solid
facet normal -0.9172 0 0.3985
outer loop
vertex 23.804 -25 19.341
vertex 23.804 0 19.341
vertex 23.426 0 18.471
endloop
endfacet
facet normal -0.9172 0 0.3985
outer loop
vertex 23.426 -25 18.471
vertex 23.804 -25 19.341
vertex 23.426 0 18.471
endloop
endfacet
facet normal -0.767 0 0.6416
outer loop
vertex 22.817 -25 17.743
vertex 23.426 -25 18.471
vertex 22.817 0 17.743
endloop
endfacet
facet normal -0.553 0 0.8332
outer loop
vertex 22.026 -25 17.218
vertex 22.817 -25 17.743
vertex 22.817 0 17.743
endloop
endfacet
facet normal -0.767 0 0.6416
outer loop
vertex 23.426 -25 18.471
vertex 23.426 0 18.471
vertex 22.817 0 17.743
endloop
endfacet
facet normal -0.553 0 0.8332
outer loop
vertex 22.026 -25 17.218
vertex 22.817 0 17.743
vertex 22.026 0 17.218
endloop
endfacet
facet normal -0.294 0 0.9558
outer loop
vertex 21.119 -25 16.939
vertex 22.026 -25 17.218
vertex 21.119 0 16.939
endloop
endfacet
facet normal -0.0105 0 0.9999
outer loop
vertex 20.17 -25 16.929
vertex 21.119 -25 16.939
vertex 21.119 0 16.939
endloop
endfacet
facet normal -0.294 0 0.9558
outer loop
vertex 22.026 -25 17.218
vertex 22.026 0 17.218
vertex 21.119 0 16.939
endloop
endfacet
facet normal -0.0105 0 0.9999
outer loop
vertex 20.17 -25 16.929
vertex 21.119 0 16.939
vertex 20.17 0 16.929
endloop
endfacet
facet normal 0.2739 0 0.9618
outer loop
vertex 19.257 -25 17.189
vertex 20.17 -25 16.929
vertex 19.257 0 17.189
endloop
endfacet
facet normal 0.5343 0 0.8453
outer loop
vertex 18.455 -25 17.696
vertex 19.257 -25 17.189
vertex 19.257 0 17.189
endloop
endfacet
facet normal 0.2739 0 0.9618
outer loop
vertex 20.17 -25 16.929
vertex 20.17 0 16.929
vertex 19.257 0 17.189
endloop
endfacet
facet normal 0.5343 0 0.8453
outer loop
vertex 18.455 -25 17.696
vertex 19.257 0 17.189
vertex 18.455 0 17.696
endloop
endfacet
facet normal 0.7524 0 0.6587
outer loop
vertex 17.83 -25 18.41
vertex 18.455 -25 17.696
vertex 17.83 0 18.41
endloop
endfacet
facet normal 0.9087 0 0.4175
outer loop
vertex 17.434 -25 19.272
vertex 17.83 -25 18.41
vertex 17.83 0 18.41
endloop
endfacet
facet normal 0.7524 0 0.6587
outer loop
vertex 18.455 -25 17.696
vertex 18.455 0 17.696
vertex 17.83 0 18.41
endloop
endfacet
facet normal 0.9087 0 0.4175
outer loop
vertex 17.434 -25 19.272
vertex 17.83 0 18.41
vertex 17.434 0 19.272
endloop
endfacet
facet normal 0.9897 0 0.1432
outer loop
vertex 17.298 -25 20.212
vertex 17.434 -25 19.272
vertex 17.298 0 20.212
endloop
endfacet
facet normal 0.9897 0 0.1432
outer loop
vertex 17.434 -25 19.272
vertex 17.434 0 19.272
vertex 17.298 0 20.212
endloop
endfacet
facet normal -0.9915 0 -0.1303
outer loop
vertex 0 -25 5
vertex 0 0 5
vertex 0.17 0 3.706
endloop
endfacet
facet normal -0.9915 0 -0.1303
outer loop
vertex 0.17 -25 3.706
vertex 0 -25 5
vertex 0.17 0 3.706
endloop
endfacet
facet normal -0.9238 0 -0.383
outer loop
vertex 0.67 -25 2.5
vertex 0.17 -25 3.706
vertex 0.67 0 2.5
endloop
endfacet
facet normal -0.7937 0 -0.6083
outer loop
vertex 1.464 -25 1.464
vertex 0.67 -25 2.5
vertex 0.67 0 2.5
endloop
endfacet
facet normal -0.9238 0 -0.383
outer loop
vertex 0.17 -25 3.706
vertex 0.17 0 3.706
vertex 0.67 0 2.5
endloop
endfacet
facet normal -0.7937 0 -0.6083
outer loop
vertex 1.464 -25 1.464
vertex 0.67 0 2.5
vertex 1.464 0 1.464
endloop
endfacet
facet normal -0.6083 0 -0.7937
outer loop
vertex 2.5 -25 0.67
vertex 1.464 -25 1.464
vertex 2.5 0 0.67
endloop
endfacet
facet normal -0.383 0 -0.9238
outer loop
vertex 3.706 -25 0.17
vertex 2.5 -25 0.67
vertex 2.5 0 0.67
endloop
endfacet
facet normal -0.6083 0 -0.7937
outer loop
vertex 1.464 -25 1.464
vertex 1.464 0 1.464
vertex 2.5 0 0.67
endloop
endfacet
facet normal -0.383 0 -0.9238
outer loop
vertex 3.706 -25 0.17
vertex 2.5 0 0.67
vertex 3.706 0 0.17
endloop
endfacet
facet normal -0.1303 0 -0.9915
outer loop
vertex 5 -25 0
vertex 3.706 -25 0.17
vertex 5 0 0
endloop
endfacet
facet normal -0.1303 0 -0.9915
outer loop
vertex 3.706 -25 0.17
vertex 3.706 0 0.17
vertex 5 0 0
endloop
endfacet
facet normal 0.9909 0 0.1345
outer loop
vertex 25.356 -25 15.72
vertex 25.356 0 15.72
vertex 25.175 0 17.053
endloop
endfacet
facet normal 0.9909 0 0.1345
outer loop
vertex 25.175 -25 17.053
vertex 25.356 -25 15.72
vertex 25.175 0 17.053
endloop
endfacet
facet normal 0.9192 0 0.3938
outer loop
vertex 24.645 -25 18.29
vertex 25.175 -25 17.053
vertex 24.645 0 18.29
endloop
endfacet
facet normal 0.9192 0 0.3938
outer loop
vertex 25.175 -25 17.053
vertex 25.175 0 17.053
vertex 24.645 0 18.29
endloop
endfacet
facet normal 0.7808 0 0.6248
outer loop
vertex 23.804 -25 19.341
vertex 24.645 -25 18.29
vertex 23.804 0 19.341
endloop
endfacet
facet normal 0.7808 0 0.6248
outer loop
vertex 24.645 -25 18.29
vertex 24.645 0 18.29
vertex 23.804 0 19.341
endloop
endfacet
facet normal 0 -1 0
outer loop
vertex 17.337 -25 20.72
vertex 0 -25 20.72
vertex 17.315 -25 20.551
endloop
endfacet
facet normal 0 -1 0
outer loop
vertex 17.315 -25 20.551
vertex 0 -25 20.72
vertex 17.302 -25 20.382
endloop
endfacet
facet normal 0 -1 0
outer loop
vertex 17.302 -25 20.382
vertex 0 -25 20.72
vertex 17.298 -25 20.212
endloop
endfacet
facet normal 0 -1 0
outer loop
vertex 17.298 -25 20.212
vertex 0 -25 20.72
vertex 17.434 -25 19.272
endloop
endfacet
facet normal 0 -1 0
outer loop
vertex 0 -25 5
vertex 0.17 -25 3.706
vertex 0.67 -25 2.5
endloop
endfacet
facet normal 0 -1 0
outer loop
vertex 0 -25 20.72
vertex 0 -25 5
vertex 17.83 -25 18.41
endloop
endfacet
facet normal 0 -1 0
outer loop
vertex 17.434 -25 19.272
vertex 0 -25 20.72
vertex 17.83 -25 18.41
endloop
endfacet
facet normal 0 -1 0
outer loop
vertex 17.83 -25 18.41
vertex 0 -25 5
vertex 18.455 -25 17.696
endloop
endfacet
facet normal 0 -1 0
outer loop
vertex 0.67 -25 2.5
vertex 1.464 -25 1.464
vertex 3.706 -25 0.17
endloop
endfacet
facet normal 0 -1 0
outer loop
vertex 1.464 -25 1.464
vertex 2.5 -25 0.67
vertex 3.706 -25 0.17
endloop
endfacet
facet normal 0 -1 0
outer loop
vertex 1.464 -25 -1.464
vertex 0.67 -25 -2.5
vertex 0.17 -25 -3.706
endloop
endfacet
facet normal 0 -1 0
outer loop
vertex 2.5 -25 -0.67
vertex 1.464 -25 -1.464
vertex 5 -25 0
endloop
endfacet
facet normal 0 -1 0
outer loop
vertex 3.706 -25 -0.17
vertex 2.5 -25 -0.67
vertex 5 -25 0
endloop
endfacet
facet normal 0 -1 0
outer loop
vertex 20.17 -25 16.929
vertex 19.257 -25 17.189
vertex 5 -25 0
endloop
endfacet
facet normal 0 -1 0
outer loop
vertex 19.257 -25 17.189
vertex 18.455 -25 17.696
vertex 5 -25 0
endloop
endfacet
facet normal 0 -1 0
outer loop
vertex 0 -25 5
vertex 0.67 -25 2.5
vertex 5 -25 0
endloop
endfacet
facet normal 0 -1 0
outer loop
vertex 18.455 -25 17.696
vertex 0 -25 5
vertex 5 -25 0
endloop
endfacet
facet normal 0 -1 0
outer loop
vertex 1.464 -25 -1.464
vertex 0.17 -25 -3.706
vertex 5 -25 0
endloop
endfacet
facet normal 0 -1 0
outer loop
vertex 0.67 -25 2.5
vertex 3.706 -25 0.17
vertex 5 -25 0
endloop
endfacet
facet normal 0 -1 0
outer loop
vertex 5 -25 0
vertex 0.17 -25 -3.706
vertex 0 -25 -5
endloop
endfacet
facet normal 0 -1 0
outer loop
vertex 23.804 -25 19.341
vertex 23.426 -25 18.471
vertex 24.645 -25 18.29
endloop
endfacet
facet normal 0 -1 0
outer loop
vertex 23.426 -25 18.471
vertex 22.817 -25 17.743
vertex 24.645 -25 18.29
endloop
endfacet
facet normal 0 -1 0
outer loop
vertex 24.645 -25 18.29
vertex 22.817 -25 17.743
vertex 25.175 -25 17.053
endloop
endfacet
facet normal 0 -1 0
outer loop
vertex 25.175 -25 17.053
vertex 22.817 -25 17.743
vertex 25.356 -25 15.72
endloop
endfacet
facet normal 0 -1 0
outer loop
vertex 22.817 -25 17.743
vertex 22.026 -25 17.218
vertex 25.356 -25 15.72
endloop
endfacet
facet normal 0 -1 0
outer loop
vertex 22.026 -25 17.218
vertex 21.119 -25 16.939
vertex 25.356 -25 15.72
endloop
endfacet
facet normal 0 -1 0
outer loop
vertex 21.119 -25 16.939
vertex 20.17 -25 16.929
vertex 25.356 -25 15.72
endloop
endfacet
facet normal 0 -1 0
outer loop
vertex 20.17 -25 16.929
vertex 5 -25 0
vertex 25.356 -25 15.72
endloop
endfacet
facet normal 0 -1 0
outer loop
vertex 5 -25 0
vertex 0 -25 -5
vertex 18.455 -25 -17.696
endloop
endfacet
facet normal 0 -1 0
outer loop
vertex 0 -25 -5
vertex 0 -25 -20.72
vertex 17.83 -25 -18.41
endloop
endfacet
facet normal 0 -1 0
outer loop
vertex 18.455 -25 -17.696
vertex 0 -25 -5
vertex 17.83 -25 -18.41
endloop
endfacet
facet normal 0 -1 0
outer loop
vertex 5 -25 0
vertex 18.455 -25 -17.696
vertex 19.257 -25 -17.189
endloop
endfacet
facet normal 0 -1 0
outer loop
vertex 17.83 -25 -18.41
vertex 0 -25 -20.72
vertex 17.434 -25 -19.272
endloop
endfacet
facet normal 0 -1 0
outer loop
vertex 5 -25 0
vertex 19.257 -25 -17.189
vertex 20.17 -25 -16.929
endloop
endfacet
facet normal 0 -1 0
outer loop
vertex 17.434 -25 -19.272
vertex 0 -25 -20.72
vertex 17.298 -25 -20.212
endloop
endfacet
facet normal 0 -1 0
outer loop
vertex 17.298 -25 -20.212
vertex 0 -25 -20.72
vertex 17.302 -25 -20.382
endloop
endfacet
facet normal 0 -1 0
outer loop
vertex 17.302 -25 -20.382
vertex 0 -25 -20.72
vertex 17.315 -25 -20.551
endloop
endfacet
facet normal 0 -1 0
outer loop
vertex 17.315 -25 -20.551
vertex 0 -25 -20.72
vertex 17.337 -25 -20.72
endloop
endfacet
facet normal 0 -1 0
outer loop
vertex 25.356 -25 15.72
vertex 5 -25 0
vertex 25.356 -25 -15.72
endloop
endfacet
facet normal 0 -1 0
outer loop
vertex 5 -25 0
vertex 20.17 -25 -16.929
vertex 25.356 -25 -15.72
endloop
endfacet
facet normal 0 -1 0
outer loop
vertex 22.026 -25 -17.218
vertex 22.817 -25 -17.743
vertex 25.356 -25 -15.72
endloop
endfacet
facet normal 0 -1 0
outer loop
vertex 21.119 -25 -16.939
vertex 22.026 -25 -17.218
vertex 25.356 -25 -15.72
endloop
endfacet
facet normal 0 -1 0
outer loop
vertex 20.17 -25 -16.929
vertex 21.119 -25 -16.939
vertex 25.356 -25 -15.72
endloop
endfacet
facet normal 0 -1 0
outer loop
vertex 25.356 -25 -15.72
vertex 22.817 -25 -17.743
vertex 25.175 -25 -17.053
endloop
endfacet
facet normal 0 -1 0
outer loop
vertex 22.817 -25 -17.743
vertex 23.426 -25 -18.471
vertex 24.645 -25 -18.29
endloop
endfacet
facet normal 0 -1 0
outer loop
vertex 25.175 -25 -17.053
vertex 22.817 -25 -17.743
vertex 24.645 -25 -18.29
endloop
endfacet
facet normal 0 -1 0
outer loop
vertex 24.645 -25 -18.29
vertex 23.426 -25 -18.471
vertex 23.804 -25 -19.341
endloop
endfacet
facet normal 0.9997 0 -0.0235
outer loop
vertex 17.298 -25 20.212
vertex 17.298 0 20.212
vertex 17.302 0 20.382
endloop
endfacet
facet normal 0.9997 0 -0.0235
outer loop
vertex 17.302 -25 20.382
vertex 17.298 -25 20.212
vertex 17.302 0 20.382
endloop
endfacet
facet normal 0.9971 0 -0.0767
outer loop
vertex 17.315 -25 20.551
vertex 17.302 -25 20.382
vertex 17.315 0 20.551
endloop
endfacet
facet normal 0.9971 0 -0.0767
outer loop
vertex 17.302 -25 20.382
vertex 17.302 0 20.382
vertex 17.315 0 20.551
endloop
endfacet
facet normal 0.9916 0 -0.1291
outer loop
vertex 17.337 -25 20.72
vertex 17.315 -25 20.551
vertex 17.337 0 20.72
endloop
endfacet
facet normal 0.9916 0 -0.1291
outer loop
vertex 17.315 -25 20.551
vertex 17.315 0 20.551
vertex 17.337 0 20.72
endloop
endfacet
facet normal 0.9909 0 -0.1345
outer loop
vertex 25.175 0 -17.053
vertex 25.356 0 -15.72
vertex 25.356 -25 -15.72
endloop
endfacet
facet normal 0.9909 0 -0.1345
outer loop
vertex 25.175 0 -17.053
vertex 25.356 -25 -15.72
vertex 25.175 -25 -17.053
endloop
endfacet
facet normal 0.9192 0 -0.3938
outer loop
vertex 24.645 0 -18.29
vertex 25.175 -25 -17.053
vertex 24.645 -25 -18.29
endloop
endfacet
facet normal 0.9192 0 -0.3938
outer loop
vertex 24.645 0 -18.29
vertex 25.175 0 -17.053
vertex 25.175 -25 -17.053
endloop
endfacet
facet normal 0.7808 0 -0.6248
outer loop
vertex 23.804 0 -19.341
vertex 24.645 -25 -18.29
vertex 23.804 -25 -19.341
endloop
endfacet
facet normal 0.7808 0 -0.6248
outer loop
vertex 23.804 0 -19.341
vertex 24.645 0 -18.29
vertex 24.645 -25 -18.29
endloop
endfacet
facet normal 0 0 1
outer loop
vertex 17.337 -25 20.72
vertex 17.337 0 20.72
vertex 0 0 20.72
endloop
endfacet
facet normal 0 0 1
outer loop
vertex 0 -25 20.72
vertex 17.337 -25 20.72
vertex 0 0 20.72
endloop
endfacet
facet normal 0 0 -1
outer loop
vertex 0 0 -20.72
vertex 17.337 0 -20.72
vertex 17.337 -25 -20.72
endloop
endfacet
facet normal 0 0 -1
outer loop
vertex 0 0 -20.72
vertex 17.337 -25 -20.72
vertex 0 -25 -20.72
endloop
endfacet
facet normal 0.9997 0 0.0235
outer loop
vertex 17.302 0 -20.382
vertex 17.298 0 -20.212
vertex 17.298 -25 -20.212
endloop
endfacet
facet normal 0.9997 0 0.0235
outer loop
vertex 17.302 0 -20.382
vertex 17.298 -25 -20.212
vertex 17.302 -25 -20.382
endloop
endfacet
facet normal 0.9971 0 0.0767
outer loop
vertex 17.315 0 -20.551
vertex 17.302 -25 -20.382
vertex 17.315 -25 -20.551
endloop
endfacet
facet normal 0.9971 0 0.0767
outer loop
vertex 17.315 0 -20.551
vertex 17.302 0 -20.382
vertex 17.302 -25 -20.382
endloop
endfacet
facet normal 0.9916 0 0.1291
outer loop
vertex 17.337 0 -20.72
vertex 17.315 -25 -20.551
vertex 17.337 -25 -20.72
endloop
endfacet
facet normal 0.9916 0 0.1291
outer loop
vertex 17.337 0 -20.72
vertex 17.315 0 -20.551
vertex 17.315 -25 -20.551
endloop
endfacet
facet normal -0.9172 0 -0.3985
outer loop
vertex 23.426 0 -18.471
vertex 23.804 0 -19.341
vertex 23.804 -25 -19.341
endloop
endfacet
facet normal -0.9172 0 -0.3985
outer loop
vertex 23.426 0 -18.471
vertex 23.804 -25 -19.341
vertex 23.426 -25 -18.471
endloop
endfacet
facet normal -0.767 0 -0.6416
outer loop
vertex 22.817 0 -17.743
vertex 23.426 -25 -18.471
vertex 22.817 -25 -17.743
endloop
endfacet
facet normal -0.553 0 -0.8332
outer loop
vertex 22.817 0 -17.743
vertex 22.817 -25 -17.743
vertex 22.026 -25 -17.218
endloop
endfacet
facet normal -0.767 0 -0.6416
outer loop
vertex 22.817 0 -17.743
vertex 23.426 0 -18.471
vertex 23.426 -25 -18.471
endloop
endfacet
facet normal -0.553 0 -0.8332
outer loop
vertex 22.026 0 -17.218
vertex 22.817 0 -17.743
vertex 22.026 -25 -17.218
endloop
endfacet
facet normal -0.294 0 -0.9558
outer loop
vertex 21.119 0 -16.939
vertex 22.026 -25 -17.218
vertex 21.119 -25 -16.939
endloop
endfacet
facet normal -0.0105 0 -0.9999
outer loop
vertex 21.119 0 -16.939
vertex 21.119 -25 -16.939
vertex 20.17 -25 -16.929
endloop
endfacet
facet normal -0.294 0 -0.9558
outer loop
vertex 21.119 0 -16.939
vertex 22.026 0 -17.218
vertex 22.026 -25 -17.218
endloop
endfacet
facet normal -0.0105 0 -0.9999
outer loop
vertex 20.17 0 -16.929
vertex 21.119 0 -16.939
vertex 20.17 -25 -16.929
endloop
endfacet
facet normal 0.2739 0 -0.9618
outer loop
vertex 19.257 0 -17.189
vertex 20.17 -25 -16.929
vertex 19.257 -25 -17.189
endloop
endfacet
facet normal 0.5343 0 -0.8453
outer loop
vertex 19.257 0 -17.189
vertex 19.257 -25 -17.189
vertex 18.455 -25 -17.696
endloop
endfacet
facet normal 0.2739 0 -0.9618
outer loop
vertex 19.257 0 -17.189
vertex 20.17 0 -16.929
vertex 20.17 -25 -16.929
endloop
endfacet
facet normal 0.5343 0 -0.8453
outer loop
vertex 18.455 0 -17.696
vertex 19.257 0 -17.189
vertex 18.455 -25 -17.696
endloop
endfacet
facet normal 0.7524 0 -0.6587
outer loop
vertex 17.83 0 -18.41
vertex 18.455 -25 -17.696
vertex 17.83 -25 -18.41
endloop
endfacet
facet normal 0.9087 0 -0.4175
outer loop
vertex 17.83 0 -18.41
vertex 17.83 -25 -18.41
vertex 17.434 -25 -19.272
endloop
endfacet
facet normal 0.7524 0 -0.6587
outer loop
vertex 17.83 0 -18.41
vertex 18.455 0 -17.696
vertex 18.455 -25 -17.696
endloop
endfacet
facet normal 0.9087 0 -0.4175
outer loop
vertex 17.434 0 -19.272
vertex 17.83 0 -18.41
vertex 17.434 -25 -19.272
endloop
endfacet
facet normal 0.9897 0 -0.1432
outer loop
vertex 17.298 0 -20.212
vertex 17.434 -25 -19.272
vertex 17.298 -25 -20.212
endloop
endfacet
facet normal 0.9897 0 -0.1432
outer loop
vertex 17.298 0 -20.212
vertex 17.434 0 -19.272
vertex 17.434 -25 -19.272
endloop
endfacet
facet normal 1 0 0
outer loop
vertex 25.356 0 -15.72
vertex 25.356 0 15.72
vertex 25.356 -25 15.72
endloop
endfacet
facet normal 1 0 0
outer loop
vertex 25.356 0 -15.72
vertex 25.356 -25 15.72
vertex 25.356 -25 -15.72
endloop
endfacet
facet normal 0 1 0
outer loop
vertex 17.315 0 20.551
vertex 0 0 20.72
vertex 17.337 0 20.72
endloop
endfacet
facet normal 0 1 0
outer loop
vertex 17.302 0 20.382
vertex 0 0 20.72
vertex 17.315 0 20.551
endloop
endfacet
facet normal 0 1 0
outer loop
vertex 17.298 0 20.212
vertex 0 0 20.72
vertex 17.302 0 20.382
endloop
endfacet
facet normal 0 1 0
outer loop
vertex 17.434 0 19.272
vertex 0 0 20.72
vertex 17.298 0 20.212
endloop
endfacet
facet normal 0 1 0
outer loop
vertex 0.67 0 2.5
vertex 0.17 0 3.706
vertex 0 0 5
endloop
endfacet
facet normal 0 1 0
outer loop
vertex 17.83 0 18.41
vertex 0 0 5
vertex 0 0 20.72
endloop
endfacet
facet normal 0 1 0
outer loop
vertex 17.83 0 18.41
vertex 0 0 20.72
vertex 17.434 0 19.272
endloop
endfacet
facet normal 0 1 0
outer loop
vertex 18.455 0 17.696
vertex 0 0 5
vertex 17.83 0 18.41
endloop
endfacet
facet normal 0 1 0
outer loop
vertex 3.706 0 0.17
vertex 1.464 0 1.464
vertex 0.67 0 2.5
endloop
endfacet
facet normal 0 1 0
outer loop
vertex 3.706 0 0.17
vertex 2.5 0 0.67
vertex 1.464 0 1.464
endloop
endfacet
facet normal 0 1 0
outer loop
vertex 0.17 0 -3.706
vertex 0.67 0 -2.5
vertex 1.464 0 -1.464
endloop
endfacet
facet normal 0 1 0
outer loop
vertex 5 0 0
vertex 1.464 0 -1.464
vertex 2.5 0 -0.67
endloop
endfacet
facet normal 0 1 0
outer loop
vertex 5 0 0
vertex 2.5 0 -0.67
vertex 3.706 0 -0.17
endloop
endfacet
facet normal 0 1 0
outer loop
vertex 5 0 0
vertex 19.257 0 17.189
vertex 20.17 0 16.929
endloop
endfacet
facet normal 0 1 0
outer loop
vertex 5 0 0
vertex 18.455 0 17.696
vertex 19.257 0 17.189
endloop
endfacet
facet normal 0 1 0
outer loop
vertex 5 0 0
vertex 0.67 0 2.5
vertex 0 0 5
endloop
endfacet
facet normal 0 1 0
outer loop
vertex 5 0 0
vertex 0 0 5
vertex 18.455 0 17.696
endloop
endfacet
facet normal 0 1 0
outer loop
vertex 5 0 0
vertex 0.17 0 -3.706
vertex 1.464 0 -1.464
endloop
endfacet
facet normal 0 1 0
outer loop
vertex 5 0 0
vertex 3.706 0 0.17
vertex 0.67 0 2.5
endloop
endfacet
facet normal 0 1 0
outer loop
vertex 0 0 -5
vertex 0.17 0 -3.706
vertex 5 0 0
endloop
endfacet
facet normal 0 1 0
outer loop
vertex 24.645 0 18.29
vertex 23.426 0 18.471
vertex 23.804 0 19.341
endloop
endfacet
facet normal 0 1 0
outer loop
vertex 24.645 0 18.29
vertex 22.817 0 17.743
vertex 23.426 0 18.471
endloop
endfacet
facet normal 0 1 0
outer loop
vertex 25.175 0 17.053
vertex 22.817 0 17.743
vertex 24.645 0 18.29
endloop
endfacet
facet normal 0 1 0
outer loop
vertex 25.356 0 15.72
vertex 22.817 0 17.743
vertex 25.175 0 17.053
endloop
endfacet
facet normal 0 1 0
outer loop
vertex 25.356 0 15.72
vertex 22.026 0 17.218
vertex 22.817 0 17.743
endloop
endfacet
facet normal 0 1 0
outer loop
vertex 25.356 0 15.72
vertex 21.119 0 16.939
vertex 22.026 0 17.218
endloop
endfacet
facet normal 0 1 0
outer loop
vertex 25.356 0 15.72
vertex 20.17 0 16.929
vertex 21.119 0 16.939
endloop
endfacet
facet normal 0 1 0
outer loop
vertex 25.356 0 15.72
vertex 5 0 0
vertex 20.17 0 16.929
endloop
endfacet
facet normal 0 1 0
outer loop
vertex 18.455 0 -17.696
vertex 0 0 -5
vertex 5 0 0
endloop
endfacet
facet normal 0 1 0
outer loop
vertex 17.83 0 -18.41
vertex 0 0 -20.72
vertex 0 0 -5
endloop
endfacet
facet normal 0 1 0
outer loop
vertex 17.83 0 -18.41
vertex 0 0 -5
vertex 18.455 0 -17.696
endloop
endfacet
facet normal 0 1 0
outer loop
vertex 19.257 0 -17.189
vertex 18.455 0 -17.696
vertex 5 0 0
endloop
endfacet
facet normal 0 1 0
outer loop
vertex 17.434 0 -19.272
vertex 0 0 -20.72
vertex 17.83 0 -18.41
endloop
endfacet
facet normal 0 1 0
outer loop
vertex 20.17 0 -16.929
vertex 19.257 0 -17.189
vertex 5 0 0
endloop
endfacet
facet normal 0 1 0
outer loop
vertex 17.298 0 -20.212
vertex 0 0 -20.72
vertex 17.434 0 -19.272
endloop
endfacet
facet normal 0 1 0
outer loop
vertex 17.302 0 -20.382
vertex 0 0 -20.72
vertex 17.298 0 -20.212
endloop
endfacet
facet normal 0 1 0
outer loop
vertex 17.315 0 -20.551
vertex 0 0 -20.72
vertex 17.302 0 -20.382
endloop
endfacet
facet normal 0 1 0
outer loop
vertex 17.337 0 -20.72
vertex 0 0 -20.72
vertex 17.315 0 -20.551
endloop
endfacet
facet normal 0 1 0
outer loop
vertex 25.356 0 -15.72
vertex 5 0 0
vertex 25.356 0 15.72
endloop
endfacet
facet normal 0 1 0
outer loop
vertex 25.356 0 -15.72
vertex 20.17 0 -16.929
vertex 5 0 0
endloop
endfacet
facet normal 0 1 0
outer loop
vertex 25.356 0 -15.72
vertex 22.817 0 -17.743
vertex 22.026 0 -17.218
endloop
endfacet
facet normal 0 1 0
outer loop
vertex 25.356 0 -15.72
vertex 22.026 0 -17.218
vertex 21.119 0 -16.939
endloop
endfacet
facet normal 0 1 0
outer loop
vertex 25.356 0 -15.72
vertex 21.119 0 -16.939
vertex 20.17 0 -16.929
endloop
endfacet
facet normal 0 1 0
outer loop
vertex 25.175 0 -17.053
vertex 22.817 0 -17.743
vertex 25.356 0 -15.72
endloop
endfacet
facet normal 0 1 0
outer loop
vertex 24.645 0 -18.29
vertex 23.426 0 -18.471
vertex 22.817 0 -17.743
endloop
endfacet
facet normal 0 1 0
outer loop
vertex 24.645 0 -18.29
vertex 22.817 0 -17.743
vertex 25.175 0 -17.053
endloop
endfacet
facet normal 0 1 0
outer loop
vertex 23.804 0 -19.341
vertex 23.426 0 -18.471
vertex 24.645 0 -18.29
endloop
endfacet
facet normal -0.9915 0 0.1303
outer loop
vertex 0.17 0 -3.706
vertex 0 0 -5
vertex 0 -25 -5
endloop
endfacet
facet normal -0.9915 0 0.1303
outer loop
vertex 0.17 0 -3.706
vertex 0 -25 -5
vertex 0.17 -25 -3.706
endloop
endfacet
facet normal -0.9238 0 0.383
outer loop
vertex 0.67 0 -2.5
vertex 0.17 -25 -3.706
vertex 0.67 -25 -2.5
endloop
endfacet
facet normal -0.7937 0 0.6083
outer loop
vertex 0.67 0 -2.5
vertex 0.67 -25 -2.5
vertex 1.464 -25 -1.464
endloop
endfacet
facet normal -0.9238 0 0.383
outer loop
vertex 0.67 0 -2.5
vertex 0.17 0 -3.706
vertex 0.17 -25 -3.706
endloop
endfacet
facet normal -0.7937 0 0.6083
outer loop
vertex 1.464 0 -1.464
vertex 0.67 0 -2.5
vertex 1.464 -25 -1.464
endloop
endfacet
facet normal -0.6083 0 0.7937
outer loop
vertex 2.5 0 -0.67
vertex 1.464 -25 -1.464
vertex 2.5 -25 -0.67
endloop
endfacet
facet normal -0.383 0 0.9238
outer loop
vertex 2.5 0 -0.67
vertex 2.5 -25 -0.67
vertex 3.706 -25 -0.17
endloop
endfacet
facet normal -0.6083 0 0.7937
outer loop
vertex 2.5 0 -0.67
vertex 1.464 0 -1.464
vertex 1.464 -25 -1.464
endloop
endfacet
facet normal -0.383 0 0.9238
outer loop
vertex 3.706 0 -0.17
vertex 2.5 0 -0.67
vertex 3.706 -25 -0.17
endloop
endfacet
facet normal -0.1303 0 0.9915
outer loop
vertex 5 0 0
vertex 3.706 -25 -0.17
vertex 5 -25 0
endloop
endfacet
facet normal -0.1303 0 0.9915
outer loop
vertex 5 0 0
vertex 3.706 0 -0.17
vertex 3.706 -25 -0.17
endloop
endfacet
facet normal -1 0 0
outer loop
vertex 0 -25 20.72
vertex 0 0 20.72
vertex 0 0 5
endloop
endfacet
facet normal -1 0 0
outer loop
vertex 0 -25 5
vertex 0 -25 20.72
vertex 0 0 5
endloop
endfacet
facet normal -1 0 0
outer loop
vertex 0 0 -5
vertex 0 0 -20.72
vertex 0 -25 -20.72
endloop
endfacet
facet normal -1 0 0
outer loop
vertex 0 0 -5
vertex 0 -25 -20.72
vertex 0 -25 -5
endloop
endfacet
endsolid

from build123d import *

# Parameters (mm, degrees)
F1_DEPTH = 25
F4_DEPTH = 25


# Not quite as in the source:
# - a pattern or mirror of a feature is missing from the dataset's text; its kind, count and spacing are read off the source's solid


with BuildPart() as f1:
    # F0 (on Front) → F1 (new body)
    with BuildSketch(Plane.XZ):
        with BuildLine():
            ThreePointArc((0, 5), (1.4644660941, 1.4644660941), (5, 0))
            Line((5, 0), (25.3563662991, 0))
            Line((25.3563662991, 0), (25.3563662991, 15.7199426368))
            ThreePointArc((25.3563662991, 15.7199426368), (23.891900205, 19.2554765427), (20.3563662991, 20.7199426368))
            Line((20.3563662991, 20.7199426368), (0, 20.7199426368))
            Line((0, 20.7199426368), (0, 5))
        make_face()
    extrude(amount=F1_DEPTH)

    # F2: F1 across face


with BuildPart() as f1_1:
    add(f1.part)
    add(f1.part.mirror(Plane(origin=(15.1781831495, -12.5, 0), x_dir=(1, 0, 0), z_dir=(0, 0, -1))))

    # F3 (on face) → F4 (cut)
    with BuildSketch(Plane(origin=(0, 0, 0), x_dir=(-1, 0, 0), z_dir=(0, 1, 0))):
        with BuildLine():
            Line((-20.3563662991, 20.7199426368), (-17.3368447248, 20.7199426368))
            ThreePointArc((-17.3368447248, 20.7199426368), (-21.2996072768, 23.4502367244), (-23.8041703997, 19.34108153))
            ThreePointArc((-23.8041703997, 19.34108153), (-22.2130172536, 20.3624470507), (-20.3563662991, 20.7199426368))
        make_face()
        with BuildLine():
            ThreePointArc((-23.8041703997, 19.34108153), (-20.1700051206, 16.929235893), (-17.2975812754, 20.2115122229))
            ThreePointArc((-17.2975812754, 20.2115122229), (-17.3074117289, 20.4664843313), (-17.3368447248, 20.7199426368))
            Line((-17.3368447248, 20.7199426368), (-20.3563662991, 20.7199426368))
            ThreePointArc((-20.3563662991, 20.7199426368), (-22.2130172536, 20.3624470507), (-23.8041703997, 19.34108153))
        make_face()
    f4 = extrude(amount=-F4_DEPTH, mode=Mode.SUBTRACT)

    # F4_copies: F4 across plane
    add(f4.mirror(Plane(origin=(0, 0, 0), x_dir=(-1, 0, 0), z_dir=(0, 0, -1))), mode=Mode.SUBTRACT)


solid = f1_1.part
